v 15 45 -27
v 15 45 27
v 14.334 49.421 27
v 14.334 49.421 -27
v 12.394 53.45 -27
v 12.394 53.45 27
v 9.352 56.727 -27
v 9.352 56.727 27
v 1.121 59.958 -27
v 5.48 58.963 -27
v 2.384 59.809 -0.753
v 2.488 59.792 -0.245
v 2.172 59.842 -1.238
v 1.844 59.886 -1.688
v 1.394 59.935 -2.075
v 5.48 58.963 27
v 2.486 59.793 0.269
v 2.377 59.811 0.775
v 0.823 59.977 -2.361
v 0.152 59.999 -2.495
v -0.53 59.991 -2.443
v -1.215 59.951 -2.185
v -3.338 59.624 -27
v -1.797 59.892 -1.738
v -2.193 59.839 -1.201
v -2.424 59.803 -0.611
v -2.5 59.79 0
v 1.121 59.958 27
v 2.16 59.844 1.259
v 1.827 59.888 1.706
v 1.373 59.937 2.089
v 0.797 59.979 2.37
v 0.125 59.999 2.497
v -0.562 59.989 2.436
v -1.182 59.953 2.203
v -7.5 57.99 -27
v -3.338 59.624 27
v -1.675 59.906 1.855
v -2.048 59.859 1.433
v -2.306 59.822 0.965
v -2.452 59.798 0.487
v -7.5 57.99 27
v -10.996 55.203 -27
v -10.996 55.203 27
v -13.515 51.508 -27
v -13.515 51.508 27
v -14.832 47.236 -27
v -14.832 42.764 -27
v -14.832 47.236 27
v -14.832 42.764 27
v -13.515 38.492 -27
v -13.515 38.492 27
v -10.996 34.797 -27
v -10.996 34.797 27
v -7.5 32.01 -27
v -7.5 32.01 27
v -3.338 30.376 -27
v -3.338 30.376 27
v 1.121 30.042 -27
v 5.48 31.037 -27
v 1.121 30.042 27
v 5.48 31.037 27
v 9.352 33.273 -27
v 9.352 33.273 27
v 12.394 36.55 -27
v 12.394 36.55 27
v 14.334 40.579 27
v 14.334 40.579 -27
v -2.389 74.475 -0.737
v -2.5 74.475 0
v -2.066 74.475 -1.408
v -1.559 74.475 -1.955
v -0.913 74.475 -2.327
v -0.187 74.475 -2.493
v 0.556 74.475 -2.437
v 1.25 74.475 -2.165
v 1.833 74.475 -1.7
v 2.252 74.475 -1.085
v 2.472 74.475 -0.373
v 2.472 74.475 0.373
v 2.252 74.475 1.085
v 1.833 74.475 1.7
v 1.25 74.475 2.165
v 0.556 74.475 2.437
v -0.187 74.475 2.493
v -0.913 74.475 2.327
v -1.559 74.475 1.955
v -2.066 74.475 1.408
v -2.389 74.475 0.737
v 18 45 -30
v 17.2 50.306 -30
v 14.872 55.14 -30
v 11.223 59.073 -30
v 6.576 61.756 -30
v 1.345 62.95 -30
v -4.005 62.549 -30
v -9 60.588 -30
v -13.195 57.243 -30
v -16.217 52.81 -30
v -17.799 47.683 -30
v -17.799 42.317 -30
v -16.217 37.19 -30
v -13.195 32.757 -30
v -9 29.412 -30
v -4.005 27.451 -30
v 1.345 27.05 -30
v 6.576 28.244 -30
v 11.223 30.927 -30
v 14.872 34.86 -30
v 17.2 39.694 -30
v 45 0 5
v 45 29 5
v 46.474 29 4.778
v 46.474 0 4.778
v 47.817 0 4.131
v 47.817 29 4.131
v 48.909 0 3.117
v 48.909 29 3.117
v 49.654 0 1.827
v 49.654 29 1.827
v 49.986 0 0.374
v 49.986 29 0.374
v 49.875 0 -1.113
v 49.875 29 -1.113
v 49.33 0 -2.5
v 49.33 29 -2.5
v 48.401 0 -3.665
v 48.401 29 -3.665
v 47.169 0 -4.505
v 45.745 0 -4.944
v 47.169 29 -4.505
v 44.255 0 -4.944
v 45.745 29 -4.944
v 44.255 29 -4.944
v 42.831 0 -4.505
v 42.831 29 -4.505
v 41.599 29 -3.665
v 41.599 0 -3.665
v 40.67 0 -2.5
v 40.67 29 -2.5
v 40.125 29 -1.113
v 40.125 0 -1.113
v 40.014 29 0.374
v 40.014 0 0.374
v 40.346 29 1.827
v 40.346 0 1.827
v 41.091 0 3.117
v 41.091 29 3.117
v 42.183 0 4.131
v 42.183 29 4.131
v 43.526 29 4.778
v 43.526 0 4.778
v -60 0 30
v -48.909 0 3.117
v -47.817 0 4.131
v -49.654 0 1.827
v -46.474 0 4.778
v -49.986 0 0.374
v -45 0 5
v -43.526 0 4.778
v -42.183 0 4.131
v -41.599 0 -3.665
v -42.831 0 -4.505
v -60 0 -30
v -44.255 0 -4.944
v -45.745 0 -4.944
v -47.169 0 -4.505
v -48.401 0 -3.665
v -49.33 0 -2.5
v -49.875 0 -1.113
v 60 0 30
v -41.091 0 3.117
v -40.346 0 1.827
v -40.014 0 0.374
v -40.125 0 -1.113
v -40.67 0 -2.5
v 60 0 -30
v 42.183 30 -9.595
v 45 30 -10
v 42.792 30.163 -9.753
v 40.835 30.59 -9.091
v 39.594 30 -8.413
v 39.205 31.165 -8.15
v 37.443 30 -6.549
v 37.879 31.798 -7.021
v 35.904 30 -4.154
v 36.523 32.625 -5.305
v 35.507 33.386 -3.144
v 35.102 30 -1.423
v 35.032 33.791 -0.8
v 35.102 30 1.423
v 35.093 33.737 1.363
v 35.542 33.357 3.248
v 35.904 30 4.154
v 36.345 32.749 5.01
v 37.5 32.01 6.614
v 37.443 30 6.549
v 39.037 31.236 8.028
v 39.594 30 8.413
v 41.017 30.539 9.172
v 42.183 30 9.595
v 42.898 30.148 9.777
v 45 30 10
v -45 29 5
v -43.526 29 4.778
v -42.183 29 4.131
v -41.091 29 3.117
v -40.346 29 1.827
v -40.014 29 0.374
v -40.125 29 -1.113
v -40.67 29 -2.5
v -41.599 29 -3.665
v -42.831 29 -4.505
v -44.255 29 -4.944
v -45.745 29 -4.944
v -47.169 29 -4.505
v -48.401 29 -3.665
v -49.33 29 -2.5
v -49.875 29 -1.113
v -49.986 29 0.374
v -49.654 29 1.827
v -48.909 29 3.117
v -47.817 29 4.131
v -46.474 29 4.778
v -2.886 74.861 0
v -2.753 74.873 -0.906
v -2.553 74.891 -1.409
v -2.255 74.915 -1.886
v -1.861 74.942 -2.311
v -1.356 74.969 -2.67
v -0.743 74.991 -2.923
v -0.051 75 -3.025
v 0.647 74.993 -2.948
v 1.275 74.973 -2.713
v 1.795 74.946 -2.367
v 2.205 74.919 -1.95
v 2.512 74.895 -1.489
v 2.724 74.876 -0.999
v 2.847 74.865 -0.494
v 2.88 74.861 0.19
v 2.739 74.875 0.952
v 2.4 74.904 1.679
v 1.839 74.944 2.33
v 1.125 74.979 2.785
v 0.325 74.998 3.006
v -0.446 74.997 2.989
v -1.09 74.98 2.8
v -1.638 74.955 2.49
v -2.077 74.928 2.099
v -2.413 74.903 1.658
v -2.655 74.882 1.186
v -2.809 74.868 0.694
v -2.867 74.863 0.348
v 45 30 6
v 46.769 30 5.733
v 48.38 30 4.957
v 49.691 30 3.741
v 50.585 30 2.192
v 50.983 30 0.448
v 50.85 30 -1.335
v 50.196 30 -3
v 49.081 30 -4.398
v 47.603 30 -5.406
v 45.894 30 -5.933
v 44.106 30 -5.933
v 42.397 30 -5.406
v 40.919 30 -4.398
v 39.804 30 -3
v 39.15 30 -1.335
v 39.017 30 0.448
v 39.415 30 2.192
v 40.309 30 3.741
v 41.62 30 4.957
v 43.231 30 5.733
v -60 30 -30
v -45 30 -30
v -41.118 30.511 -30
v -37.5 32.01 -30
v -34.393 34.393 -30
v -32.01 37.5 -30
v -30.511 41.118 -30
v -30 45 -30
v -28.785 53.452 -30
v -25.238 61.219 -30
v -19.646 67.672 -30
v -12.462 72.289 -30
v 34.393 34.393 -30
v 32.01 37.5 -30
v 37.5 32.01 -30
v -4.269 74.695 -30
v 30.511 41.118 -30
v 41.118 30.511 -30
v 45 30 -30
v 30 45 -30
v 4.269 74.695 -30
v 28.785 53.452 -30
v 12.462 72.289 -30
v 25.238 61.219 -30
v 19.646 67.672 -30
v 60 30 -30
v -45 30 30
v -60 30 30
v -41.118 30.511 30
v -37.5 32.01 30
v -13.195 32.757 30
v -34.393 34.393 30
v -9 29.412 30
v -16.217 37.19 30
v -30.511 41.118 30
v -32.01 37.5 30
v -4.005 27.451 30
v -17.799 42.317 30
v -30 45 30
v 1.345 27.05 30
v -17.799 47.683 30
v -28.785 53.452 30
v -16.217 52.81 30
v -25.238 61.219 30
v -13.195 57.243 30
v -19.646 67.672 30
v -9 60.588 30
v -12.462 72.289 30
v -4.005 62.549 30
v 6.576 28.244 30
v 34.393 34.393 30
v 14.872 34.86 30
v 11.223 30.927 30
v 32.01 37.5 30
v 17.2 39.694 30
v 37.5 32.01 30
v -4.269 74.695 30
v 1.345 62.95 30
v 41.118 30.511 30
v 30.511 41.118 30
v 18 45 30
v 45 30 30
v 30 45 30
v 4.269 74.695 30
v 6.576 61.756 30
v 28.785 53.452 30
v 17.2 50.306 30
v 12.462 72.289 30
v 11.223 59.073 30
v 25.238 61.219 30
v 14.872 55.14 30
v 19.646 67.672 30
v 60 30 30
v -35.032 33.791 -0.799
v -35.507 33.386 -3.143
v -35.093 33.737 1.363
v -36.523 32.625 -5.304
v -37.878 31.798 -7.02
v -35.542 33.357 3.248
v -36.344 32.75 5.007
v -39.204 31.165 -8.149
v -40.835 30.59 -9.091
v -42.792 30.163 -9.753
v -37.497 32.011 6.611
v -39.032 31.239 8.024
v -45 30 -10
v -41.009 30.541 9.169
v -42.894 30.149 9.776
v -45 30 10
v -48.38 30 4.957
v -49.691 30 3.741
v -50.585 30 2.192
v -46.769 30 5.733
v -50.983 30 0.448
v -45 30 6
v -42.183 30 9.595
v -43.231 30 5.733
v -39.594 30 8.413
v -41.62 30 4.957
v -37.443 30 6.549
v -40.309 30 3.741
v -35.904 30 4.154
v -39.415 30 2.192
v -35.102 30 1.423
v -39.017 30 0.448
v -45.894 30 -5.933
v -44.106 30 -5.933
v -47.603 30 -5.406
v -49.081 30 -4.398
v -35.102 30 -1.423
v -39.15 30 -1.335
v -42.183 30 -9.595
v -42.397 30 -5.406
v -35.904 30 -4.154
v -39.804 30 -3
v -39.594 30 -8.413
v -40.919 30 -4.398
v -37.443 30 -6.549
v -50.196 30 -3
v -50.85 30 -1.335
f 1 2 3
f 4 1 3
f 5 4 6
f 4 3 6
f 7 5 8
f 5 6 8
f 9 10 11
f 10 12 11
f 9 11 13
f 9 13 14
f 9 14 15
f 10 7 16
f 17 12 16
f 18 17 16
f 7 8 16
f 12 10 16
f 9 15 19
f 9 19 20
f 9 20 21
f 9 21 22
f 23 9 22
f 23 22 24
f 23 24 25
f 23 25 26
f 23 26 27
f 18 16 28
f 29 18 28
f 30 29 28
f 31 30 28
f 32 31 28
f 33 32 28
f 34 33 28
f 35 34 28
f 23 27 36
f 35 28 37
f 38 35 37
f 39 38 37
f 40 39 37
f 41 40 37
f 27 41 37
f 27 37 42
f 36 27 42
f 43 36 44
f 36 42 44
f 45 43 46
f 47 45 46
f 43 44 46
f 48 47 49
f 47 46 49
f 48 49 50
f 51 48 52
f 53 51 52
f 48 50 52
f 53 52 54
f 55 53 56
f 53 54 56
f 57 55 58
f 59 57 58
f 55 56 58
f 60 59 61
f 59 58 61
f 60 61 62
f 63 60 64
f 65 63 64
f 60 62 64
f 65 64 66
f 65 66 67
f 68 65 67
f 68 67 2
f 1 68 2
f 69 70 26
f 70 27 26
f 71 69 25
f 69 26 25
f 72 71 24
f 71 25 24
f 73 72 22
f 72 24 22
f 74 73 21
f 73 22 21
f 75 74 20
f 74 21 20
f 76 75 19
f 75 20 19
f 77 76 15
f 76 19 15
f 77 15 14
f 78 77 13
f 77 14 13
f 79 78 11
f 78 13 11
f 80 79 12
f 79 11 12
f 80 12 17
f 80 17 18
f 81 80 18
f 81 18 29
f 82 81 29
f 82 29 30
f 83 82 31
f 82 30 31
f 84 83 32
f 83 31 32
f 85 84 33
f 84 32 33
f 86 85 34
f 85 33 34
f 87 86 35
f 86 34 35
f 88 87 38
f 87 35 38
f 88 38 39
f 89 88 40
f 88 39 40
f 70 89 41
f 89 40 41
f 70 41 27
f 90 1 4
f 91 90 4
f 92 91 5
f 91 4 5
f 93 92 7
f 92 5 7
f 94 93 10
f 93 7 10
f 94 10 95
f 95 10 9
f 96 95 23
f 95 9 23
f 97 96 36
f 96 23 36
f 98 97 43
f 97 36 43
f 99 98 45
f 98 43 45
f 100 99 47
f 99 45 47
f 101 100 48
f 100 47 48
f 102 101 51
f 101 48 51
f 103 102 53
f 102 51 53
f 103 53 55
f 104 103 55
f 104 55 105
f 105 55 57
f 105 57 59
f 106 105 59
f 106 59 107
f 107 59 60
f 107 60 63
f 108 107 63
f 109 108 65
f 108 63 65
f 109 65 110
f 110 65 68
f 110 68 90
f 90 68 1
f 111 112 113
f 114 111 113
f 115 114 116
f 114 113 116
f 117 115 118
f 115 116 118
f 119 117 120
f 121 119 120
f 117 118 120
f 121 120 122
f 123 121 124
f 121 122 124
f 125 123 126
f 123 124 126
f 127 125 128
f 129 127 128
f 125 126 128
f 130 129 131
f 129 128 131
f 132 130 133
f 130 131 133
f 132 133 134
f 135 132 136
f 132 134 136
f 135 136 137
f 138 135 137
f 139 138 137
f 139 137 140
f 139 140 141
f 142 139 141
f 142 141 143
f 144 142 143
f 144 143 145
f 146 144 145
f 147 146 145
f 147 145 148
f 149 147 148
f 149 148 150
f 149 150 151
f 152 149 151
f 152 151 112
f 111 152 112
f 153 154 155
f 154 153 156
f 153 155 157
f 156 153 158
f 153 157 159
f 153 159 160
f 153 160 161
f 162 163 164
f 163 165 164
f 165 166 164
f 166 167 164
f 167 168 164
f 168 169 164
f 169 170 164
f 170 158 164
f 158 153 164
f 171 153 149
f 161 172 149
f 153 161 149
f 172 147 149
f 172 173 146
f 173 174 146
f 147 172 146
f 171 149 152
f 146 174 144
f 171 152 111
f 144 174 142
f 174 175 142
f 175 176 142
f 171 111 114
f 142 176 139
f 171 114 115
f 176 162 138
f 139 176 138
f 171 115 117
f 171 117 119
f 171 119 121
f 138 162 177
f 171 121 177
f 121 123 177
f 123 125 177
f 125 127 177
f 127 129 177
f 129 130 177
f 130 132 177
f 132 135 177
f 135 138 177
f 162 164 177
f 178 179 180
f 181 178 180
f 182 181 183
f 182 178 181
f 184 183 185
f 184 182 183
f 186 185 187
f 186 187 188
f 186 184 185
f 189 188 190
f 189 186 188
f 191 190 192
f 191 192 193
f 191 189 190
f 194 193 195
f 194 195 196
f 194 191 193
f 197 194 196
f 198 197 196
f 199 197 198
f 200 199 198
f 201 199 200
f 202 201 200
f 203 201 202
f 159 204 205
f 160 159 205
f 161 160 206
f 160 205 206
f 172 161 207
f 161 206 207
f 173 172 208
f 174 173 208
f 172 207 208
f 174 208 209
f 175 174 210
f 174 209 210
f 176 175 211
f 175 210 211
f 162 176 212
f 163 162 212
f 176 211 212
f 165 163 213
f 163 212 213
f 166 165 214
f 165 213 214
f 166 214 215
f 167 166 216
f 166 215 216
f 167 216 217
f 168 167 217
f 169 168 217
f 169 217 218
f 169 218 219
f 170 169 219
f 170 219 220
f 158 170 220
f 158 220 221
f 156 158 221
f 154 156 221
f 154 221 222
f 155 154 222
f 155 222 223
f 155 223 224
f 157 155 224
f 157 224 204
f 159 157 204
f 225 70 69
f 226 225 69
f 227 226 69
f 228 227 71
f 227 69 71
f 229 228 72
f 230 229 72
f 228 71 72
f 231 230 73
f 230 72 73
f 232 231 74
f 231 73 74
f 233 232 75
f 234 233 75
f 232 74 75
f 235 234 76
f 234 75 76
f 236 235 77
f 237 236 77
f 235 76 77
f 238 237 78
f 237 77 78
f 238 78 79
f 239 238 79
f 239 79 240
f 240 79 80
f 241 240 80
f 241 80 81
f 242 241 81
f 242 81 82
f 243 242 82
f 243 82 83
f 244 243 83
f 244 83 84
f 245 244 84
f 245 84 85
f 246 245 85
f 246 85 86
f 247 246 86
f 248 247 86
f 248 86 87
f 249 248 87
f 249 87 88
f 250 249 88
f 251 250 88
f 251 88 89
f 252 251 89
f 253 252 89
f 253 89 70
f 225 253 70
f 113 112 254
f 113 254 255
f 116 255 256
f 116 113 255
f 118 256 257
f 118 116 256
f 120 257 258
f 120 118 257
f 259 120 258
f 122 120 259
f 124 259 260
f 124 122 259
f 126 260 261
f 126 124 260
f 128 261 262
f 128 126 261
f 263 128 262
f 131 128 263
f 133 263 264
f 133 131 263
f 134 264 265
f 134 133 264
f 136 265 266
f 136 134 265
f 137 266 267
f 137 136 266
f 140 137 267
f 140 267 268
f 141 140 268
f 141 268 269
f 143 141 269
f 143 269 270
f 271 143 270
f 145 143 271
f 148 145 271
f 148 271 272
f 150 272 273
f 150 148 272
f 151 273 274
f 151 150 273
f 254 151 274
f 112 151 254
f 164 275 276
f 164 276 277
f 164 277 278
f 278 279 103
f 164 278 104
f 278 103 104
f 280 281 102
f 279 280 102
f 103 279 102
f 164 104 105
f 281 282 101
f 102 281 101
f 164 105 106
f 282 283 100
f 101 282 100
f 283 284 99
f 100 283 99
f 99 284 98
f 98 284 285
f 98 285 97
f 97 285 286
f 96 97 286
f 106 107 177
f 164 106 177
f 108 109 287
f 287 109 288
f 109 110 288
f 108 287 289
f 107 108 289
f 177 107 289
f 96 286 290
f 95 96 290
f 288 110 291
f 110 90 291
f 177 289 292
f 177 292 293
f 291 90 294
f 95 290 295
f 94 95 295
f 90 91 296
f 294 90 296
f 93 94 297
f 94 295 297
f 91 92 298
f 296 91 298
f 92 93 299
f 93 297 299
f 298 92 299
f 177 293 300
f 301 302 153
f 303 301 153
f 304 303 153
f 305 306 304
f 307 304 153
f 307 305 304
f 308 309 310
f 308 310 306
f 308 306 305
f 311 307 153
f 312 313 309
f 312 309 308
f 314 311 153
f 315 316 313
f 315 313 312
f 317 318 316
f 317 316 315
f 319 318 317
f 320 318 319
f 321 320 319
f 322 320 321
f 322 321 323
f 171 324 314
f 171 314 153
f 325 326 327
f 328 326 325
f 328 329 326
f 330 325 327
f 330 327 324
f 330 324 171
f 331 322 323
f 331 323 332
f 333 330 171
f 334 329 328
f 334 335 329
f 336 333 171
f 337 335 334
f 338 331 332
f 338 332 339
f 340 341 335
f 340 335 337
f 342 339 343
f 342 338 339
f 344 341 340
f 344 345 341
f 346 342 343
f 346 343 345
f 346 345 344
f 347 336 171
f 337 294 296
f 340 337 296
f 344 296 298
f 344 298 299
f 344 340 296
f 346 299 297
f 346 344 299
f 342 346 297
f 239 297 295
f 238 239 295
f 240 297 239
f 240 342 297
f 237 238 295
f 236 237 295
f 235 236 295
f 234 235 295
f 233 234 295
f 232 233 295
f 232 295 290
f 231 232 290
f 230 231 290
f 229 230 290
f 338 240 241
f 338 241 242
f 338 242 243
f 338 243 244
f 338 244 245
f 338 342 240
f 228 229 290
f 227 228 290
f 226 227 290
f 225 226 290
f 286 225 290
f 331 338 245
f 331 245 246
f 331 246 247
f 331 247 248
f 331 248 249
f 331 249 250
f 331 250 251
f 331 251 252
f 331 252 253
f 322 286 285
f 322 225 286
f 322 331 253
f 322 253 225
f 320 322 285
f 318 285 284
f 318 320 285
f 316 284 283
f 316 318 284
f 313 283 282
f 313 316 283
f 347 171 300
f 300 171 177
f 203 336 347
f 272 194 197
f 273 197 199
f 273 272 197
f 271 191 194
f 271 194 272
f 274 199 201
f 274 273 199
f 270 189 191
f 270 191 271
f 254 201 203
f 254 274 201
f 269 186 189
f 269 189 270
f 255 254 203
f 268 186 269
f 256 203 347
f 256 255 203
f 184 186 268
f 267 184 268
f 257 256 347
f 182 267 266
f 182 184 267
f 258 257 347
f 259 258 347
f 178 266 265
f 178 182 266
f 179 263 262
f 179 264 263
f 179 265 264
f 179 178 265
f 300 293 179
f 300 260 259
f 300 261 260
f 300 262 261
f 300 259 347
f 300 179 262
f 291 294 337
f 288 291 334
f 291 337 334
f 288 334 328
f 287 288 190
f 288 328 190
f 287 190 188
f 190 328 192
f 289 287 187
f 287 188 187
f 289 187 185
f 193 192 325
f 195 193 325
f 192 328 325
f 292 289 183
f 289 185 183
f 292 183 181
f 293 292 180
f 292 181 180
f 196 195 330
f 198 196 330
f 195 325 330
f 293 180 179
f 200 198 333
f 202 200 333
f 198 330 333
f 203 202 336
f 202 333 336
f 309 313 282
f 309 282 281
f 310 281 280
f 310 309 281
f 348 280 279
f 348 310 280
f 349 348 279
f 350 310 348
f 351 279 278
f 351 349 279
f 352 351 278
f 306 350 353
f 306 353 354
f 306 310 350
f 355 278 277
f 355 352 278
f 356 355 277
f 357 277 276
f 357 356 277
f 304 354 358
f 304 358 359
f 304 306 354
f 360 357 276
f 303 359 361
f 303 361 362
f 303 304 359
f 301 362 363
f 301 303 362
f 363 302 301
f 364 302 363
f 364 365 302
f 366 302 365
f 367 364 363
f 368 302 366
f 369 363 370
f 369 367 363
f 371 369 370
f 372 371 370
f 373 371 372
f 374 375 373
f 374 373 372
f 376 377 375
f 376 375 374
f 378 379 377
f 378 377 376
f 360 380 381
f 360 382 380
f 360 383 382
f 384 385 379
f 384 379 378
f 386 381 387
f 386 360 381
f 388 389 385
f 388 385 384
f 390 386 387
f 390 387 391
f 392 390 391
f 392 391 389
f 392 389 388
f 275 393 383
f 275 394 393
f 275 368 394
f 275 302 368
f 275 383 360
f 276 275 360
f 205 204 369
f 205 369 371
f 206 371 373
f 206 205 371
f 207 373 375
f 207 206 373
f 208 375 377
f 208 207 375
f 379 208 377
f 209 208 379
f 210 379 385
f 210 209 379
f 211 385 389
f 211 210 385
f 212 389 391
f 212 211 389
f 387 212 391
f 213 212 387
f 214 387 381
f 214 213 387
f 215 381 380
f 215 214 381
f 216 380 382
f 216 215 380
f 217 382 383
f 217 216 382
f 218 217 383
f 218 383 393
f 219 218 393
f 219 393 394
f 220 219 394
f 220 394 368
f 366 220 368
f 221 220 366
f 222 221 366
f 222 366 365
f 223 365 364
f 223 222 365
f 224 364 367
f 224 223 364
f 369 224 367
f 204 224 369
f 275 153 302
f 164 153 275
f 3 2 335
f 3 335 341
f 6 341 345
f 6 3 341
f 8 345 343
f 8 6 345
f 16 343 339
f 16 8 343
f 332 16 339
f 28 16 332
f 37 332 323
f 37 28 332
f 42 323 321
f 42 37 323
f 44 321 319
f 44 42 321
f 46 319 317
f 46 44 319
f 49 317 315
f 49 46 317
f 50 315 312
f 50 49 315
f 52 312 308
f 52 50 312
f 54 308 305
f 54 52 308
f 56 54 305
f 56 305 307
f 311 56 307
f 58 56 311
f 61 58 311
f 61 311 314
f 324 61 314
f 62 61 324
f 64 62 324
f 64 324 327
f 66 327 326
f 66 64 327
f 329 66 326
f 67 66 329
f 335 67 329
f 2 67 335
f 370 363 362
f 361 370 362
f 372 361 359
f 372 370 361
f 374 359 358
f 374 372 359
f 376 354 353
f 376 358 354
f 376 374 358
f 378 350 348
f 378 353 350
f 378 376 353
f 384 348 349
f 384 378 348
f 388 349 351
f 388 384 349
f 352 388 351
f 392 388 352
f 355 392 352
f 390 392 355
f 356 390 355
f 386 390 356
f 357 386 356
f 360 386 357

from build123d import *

# Parameters (mm, degrees)
SKETCH1_W                   = 120
SKETCH1_H                   = 60
BOSS_EXTRUDE1_DEPTH         = 30
SKETCH2_R                   = 30
BOSS_EXTRUDE2_DEPTH         = 60
SKETCH3_R                   = 15
CUT_EXTRUDE1_DEPTH          = 114.247516529
CHAMFER1_SIZE               = 3
FILLET2_R                   = 15
SKETCH4_R                   = 10
CUT_EXTRUDE2_DEPTH          = 5
SKETCH5_R                   = 5
CUT_EXTRUDE3_DEPTH          = 81.777472144
CHAMFER2_SIZE               = 1
M6_TAPPED_HOLE2_D           = 5
M6_TAPPED_HOLE2_DEPTH       = 29.999
M6_TAPPED_HOLE2_CSINK_D     = 6.05
M6_TAPPED_HOLE2_CSINK_ANGLE = 90
M6_TAPPED_HOLE2_TIP         = 1.502151548


with BuildPart() as part:
    # Sketch1 → Boss-Extrude1 (new body)
    with BuildSketch(Plane(origin=(0, 0, 0), x_dir=(1, 0, 0), z_dir=(0, 1, 0))):
        Rectangle(SKETCH1_W, SKETCH1_H)
    extrude(amount=BOSS_EXTRUDE1_DEPTH)

    # Sketch2 → Boss-Extrude2 (add)
    with BuildSketch(Plane.XY.offset(30)):
        with Locations((0, 45)):
            Circle(SKETCH2_R)
    extrude(amount=-BOSS_EXTRUDE2_DEPTH)

    # Sketch3 → Cut-Extrude1 (cut, through all)
    with BuildSketch(Plane.XY.offset(30)):
        with Locations((0, 45)):
            Circle(SKETCH3_R)
    extrude(amount=-CUT_EXTRUDE1_DEPTH, mode=Mode.SUBTRACT)

    # Chamfer1
    chamfer1_edges = [part.edges().sort_by_distance(p)[0] for p in [
        (-15, 45, -30),
        (-15, 45, 30),
    ]]
    chamfer(chamfer1_edges, length=CHAMFER1_SIZE)

    # Fillet2
    fillet2_edges = [part.edges().sort_by_distance(p)[0] for p in [
        (-25.980762114, 30, 0),
        (25.980762114, 30, 0),
    ]]
    fillet(fillet2_edges, radius=FILLET2_R)

    # Sketch4 → Cut-Extrude2 (cut)
    with BuildSketch(Plane(origin=(0, 30, 0), x_dir=(1, 0, 0), z_dir=(0, 1, 0))):
        with Locations((-45, 0)):
            Circle(SKETCH4_R)
        with Locations((45, 0)):
            Circle(SKETCH4_R)
    extrude(amount=CUT_EXTRUDE2_DEPTH, mode=Mode.SUBTRACT)

    # Sketch5 → Cut-Extrude3 (cut, through all)
    with BuildSketch(Plane(origin=(0, 30, 0), x_dir=(1, 0, 0), z_dir=(0, 1, 0))):
        with Locations(Location((-45, 0, 0), (0, 0, 270))):
            Circle(SKETCH5_R)
        with Locations(Location((45, 0, 0), (0, 0, 270))):
            Circle(SKETCH5_R)
    extrude(amount=-CUT_EXTRUDE3_DEPTH, mode=Mode.SUBTRACT)

    # Chamfer2
    chamfer2_edges = [part.edges().sort_by_distance(p)[0] for p in [
        (-45, 30, -5),
        (45, 30, -5),
    ]]
    chamfer(chamfer2_edges, length=CHAMFER2_SIZE)

    # M6 Tapped Hole2
    with Locations(Plane(origin=(0, 75, 0), x_dir=(1, 0, 0), z_dir=(0, 1, 0))):
        with Locations((0, 0)):
            CounterSinkHole(M6_TAPPED_HOLE2_D / 2, M6_TAPPED_HOLE2_CSINK_D / 2, depth=M6_TAPPED_HOLE2_DEPTH, counter_sink_angle=M6_TAPPED_HOLE2_CSINK_ANGLE)
            with Locations((0, 0, -(M6_TAPPED_HOLE2_DEPTH + M6_TAPPED_HOLE2_TIP / 2))):  # 118° drill point
                Cone(0, M6_TAPPED_HOLE2_D / 2, M6_TAPPED_HOLE2_TIP, mode=Mode.SUBTRACT)


solid = part.part
